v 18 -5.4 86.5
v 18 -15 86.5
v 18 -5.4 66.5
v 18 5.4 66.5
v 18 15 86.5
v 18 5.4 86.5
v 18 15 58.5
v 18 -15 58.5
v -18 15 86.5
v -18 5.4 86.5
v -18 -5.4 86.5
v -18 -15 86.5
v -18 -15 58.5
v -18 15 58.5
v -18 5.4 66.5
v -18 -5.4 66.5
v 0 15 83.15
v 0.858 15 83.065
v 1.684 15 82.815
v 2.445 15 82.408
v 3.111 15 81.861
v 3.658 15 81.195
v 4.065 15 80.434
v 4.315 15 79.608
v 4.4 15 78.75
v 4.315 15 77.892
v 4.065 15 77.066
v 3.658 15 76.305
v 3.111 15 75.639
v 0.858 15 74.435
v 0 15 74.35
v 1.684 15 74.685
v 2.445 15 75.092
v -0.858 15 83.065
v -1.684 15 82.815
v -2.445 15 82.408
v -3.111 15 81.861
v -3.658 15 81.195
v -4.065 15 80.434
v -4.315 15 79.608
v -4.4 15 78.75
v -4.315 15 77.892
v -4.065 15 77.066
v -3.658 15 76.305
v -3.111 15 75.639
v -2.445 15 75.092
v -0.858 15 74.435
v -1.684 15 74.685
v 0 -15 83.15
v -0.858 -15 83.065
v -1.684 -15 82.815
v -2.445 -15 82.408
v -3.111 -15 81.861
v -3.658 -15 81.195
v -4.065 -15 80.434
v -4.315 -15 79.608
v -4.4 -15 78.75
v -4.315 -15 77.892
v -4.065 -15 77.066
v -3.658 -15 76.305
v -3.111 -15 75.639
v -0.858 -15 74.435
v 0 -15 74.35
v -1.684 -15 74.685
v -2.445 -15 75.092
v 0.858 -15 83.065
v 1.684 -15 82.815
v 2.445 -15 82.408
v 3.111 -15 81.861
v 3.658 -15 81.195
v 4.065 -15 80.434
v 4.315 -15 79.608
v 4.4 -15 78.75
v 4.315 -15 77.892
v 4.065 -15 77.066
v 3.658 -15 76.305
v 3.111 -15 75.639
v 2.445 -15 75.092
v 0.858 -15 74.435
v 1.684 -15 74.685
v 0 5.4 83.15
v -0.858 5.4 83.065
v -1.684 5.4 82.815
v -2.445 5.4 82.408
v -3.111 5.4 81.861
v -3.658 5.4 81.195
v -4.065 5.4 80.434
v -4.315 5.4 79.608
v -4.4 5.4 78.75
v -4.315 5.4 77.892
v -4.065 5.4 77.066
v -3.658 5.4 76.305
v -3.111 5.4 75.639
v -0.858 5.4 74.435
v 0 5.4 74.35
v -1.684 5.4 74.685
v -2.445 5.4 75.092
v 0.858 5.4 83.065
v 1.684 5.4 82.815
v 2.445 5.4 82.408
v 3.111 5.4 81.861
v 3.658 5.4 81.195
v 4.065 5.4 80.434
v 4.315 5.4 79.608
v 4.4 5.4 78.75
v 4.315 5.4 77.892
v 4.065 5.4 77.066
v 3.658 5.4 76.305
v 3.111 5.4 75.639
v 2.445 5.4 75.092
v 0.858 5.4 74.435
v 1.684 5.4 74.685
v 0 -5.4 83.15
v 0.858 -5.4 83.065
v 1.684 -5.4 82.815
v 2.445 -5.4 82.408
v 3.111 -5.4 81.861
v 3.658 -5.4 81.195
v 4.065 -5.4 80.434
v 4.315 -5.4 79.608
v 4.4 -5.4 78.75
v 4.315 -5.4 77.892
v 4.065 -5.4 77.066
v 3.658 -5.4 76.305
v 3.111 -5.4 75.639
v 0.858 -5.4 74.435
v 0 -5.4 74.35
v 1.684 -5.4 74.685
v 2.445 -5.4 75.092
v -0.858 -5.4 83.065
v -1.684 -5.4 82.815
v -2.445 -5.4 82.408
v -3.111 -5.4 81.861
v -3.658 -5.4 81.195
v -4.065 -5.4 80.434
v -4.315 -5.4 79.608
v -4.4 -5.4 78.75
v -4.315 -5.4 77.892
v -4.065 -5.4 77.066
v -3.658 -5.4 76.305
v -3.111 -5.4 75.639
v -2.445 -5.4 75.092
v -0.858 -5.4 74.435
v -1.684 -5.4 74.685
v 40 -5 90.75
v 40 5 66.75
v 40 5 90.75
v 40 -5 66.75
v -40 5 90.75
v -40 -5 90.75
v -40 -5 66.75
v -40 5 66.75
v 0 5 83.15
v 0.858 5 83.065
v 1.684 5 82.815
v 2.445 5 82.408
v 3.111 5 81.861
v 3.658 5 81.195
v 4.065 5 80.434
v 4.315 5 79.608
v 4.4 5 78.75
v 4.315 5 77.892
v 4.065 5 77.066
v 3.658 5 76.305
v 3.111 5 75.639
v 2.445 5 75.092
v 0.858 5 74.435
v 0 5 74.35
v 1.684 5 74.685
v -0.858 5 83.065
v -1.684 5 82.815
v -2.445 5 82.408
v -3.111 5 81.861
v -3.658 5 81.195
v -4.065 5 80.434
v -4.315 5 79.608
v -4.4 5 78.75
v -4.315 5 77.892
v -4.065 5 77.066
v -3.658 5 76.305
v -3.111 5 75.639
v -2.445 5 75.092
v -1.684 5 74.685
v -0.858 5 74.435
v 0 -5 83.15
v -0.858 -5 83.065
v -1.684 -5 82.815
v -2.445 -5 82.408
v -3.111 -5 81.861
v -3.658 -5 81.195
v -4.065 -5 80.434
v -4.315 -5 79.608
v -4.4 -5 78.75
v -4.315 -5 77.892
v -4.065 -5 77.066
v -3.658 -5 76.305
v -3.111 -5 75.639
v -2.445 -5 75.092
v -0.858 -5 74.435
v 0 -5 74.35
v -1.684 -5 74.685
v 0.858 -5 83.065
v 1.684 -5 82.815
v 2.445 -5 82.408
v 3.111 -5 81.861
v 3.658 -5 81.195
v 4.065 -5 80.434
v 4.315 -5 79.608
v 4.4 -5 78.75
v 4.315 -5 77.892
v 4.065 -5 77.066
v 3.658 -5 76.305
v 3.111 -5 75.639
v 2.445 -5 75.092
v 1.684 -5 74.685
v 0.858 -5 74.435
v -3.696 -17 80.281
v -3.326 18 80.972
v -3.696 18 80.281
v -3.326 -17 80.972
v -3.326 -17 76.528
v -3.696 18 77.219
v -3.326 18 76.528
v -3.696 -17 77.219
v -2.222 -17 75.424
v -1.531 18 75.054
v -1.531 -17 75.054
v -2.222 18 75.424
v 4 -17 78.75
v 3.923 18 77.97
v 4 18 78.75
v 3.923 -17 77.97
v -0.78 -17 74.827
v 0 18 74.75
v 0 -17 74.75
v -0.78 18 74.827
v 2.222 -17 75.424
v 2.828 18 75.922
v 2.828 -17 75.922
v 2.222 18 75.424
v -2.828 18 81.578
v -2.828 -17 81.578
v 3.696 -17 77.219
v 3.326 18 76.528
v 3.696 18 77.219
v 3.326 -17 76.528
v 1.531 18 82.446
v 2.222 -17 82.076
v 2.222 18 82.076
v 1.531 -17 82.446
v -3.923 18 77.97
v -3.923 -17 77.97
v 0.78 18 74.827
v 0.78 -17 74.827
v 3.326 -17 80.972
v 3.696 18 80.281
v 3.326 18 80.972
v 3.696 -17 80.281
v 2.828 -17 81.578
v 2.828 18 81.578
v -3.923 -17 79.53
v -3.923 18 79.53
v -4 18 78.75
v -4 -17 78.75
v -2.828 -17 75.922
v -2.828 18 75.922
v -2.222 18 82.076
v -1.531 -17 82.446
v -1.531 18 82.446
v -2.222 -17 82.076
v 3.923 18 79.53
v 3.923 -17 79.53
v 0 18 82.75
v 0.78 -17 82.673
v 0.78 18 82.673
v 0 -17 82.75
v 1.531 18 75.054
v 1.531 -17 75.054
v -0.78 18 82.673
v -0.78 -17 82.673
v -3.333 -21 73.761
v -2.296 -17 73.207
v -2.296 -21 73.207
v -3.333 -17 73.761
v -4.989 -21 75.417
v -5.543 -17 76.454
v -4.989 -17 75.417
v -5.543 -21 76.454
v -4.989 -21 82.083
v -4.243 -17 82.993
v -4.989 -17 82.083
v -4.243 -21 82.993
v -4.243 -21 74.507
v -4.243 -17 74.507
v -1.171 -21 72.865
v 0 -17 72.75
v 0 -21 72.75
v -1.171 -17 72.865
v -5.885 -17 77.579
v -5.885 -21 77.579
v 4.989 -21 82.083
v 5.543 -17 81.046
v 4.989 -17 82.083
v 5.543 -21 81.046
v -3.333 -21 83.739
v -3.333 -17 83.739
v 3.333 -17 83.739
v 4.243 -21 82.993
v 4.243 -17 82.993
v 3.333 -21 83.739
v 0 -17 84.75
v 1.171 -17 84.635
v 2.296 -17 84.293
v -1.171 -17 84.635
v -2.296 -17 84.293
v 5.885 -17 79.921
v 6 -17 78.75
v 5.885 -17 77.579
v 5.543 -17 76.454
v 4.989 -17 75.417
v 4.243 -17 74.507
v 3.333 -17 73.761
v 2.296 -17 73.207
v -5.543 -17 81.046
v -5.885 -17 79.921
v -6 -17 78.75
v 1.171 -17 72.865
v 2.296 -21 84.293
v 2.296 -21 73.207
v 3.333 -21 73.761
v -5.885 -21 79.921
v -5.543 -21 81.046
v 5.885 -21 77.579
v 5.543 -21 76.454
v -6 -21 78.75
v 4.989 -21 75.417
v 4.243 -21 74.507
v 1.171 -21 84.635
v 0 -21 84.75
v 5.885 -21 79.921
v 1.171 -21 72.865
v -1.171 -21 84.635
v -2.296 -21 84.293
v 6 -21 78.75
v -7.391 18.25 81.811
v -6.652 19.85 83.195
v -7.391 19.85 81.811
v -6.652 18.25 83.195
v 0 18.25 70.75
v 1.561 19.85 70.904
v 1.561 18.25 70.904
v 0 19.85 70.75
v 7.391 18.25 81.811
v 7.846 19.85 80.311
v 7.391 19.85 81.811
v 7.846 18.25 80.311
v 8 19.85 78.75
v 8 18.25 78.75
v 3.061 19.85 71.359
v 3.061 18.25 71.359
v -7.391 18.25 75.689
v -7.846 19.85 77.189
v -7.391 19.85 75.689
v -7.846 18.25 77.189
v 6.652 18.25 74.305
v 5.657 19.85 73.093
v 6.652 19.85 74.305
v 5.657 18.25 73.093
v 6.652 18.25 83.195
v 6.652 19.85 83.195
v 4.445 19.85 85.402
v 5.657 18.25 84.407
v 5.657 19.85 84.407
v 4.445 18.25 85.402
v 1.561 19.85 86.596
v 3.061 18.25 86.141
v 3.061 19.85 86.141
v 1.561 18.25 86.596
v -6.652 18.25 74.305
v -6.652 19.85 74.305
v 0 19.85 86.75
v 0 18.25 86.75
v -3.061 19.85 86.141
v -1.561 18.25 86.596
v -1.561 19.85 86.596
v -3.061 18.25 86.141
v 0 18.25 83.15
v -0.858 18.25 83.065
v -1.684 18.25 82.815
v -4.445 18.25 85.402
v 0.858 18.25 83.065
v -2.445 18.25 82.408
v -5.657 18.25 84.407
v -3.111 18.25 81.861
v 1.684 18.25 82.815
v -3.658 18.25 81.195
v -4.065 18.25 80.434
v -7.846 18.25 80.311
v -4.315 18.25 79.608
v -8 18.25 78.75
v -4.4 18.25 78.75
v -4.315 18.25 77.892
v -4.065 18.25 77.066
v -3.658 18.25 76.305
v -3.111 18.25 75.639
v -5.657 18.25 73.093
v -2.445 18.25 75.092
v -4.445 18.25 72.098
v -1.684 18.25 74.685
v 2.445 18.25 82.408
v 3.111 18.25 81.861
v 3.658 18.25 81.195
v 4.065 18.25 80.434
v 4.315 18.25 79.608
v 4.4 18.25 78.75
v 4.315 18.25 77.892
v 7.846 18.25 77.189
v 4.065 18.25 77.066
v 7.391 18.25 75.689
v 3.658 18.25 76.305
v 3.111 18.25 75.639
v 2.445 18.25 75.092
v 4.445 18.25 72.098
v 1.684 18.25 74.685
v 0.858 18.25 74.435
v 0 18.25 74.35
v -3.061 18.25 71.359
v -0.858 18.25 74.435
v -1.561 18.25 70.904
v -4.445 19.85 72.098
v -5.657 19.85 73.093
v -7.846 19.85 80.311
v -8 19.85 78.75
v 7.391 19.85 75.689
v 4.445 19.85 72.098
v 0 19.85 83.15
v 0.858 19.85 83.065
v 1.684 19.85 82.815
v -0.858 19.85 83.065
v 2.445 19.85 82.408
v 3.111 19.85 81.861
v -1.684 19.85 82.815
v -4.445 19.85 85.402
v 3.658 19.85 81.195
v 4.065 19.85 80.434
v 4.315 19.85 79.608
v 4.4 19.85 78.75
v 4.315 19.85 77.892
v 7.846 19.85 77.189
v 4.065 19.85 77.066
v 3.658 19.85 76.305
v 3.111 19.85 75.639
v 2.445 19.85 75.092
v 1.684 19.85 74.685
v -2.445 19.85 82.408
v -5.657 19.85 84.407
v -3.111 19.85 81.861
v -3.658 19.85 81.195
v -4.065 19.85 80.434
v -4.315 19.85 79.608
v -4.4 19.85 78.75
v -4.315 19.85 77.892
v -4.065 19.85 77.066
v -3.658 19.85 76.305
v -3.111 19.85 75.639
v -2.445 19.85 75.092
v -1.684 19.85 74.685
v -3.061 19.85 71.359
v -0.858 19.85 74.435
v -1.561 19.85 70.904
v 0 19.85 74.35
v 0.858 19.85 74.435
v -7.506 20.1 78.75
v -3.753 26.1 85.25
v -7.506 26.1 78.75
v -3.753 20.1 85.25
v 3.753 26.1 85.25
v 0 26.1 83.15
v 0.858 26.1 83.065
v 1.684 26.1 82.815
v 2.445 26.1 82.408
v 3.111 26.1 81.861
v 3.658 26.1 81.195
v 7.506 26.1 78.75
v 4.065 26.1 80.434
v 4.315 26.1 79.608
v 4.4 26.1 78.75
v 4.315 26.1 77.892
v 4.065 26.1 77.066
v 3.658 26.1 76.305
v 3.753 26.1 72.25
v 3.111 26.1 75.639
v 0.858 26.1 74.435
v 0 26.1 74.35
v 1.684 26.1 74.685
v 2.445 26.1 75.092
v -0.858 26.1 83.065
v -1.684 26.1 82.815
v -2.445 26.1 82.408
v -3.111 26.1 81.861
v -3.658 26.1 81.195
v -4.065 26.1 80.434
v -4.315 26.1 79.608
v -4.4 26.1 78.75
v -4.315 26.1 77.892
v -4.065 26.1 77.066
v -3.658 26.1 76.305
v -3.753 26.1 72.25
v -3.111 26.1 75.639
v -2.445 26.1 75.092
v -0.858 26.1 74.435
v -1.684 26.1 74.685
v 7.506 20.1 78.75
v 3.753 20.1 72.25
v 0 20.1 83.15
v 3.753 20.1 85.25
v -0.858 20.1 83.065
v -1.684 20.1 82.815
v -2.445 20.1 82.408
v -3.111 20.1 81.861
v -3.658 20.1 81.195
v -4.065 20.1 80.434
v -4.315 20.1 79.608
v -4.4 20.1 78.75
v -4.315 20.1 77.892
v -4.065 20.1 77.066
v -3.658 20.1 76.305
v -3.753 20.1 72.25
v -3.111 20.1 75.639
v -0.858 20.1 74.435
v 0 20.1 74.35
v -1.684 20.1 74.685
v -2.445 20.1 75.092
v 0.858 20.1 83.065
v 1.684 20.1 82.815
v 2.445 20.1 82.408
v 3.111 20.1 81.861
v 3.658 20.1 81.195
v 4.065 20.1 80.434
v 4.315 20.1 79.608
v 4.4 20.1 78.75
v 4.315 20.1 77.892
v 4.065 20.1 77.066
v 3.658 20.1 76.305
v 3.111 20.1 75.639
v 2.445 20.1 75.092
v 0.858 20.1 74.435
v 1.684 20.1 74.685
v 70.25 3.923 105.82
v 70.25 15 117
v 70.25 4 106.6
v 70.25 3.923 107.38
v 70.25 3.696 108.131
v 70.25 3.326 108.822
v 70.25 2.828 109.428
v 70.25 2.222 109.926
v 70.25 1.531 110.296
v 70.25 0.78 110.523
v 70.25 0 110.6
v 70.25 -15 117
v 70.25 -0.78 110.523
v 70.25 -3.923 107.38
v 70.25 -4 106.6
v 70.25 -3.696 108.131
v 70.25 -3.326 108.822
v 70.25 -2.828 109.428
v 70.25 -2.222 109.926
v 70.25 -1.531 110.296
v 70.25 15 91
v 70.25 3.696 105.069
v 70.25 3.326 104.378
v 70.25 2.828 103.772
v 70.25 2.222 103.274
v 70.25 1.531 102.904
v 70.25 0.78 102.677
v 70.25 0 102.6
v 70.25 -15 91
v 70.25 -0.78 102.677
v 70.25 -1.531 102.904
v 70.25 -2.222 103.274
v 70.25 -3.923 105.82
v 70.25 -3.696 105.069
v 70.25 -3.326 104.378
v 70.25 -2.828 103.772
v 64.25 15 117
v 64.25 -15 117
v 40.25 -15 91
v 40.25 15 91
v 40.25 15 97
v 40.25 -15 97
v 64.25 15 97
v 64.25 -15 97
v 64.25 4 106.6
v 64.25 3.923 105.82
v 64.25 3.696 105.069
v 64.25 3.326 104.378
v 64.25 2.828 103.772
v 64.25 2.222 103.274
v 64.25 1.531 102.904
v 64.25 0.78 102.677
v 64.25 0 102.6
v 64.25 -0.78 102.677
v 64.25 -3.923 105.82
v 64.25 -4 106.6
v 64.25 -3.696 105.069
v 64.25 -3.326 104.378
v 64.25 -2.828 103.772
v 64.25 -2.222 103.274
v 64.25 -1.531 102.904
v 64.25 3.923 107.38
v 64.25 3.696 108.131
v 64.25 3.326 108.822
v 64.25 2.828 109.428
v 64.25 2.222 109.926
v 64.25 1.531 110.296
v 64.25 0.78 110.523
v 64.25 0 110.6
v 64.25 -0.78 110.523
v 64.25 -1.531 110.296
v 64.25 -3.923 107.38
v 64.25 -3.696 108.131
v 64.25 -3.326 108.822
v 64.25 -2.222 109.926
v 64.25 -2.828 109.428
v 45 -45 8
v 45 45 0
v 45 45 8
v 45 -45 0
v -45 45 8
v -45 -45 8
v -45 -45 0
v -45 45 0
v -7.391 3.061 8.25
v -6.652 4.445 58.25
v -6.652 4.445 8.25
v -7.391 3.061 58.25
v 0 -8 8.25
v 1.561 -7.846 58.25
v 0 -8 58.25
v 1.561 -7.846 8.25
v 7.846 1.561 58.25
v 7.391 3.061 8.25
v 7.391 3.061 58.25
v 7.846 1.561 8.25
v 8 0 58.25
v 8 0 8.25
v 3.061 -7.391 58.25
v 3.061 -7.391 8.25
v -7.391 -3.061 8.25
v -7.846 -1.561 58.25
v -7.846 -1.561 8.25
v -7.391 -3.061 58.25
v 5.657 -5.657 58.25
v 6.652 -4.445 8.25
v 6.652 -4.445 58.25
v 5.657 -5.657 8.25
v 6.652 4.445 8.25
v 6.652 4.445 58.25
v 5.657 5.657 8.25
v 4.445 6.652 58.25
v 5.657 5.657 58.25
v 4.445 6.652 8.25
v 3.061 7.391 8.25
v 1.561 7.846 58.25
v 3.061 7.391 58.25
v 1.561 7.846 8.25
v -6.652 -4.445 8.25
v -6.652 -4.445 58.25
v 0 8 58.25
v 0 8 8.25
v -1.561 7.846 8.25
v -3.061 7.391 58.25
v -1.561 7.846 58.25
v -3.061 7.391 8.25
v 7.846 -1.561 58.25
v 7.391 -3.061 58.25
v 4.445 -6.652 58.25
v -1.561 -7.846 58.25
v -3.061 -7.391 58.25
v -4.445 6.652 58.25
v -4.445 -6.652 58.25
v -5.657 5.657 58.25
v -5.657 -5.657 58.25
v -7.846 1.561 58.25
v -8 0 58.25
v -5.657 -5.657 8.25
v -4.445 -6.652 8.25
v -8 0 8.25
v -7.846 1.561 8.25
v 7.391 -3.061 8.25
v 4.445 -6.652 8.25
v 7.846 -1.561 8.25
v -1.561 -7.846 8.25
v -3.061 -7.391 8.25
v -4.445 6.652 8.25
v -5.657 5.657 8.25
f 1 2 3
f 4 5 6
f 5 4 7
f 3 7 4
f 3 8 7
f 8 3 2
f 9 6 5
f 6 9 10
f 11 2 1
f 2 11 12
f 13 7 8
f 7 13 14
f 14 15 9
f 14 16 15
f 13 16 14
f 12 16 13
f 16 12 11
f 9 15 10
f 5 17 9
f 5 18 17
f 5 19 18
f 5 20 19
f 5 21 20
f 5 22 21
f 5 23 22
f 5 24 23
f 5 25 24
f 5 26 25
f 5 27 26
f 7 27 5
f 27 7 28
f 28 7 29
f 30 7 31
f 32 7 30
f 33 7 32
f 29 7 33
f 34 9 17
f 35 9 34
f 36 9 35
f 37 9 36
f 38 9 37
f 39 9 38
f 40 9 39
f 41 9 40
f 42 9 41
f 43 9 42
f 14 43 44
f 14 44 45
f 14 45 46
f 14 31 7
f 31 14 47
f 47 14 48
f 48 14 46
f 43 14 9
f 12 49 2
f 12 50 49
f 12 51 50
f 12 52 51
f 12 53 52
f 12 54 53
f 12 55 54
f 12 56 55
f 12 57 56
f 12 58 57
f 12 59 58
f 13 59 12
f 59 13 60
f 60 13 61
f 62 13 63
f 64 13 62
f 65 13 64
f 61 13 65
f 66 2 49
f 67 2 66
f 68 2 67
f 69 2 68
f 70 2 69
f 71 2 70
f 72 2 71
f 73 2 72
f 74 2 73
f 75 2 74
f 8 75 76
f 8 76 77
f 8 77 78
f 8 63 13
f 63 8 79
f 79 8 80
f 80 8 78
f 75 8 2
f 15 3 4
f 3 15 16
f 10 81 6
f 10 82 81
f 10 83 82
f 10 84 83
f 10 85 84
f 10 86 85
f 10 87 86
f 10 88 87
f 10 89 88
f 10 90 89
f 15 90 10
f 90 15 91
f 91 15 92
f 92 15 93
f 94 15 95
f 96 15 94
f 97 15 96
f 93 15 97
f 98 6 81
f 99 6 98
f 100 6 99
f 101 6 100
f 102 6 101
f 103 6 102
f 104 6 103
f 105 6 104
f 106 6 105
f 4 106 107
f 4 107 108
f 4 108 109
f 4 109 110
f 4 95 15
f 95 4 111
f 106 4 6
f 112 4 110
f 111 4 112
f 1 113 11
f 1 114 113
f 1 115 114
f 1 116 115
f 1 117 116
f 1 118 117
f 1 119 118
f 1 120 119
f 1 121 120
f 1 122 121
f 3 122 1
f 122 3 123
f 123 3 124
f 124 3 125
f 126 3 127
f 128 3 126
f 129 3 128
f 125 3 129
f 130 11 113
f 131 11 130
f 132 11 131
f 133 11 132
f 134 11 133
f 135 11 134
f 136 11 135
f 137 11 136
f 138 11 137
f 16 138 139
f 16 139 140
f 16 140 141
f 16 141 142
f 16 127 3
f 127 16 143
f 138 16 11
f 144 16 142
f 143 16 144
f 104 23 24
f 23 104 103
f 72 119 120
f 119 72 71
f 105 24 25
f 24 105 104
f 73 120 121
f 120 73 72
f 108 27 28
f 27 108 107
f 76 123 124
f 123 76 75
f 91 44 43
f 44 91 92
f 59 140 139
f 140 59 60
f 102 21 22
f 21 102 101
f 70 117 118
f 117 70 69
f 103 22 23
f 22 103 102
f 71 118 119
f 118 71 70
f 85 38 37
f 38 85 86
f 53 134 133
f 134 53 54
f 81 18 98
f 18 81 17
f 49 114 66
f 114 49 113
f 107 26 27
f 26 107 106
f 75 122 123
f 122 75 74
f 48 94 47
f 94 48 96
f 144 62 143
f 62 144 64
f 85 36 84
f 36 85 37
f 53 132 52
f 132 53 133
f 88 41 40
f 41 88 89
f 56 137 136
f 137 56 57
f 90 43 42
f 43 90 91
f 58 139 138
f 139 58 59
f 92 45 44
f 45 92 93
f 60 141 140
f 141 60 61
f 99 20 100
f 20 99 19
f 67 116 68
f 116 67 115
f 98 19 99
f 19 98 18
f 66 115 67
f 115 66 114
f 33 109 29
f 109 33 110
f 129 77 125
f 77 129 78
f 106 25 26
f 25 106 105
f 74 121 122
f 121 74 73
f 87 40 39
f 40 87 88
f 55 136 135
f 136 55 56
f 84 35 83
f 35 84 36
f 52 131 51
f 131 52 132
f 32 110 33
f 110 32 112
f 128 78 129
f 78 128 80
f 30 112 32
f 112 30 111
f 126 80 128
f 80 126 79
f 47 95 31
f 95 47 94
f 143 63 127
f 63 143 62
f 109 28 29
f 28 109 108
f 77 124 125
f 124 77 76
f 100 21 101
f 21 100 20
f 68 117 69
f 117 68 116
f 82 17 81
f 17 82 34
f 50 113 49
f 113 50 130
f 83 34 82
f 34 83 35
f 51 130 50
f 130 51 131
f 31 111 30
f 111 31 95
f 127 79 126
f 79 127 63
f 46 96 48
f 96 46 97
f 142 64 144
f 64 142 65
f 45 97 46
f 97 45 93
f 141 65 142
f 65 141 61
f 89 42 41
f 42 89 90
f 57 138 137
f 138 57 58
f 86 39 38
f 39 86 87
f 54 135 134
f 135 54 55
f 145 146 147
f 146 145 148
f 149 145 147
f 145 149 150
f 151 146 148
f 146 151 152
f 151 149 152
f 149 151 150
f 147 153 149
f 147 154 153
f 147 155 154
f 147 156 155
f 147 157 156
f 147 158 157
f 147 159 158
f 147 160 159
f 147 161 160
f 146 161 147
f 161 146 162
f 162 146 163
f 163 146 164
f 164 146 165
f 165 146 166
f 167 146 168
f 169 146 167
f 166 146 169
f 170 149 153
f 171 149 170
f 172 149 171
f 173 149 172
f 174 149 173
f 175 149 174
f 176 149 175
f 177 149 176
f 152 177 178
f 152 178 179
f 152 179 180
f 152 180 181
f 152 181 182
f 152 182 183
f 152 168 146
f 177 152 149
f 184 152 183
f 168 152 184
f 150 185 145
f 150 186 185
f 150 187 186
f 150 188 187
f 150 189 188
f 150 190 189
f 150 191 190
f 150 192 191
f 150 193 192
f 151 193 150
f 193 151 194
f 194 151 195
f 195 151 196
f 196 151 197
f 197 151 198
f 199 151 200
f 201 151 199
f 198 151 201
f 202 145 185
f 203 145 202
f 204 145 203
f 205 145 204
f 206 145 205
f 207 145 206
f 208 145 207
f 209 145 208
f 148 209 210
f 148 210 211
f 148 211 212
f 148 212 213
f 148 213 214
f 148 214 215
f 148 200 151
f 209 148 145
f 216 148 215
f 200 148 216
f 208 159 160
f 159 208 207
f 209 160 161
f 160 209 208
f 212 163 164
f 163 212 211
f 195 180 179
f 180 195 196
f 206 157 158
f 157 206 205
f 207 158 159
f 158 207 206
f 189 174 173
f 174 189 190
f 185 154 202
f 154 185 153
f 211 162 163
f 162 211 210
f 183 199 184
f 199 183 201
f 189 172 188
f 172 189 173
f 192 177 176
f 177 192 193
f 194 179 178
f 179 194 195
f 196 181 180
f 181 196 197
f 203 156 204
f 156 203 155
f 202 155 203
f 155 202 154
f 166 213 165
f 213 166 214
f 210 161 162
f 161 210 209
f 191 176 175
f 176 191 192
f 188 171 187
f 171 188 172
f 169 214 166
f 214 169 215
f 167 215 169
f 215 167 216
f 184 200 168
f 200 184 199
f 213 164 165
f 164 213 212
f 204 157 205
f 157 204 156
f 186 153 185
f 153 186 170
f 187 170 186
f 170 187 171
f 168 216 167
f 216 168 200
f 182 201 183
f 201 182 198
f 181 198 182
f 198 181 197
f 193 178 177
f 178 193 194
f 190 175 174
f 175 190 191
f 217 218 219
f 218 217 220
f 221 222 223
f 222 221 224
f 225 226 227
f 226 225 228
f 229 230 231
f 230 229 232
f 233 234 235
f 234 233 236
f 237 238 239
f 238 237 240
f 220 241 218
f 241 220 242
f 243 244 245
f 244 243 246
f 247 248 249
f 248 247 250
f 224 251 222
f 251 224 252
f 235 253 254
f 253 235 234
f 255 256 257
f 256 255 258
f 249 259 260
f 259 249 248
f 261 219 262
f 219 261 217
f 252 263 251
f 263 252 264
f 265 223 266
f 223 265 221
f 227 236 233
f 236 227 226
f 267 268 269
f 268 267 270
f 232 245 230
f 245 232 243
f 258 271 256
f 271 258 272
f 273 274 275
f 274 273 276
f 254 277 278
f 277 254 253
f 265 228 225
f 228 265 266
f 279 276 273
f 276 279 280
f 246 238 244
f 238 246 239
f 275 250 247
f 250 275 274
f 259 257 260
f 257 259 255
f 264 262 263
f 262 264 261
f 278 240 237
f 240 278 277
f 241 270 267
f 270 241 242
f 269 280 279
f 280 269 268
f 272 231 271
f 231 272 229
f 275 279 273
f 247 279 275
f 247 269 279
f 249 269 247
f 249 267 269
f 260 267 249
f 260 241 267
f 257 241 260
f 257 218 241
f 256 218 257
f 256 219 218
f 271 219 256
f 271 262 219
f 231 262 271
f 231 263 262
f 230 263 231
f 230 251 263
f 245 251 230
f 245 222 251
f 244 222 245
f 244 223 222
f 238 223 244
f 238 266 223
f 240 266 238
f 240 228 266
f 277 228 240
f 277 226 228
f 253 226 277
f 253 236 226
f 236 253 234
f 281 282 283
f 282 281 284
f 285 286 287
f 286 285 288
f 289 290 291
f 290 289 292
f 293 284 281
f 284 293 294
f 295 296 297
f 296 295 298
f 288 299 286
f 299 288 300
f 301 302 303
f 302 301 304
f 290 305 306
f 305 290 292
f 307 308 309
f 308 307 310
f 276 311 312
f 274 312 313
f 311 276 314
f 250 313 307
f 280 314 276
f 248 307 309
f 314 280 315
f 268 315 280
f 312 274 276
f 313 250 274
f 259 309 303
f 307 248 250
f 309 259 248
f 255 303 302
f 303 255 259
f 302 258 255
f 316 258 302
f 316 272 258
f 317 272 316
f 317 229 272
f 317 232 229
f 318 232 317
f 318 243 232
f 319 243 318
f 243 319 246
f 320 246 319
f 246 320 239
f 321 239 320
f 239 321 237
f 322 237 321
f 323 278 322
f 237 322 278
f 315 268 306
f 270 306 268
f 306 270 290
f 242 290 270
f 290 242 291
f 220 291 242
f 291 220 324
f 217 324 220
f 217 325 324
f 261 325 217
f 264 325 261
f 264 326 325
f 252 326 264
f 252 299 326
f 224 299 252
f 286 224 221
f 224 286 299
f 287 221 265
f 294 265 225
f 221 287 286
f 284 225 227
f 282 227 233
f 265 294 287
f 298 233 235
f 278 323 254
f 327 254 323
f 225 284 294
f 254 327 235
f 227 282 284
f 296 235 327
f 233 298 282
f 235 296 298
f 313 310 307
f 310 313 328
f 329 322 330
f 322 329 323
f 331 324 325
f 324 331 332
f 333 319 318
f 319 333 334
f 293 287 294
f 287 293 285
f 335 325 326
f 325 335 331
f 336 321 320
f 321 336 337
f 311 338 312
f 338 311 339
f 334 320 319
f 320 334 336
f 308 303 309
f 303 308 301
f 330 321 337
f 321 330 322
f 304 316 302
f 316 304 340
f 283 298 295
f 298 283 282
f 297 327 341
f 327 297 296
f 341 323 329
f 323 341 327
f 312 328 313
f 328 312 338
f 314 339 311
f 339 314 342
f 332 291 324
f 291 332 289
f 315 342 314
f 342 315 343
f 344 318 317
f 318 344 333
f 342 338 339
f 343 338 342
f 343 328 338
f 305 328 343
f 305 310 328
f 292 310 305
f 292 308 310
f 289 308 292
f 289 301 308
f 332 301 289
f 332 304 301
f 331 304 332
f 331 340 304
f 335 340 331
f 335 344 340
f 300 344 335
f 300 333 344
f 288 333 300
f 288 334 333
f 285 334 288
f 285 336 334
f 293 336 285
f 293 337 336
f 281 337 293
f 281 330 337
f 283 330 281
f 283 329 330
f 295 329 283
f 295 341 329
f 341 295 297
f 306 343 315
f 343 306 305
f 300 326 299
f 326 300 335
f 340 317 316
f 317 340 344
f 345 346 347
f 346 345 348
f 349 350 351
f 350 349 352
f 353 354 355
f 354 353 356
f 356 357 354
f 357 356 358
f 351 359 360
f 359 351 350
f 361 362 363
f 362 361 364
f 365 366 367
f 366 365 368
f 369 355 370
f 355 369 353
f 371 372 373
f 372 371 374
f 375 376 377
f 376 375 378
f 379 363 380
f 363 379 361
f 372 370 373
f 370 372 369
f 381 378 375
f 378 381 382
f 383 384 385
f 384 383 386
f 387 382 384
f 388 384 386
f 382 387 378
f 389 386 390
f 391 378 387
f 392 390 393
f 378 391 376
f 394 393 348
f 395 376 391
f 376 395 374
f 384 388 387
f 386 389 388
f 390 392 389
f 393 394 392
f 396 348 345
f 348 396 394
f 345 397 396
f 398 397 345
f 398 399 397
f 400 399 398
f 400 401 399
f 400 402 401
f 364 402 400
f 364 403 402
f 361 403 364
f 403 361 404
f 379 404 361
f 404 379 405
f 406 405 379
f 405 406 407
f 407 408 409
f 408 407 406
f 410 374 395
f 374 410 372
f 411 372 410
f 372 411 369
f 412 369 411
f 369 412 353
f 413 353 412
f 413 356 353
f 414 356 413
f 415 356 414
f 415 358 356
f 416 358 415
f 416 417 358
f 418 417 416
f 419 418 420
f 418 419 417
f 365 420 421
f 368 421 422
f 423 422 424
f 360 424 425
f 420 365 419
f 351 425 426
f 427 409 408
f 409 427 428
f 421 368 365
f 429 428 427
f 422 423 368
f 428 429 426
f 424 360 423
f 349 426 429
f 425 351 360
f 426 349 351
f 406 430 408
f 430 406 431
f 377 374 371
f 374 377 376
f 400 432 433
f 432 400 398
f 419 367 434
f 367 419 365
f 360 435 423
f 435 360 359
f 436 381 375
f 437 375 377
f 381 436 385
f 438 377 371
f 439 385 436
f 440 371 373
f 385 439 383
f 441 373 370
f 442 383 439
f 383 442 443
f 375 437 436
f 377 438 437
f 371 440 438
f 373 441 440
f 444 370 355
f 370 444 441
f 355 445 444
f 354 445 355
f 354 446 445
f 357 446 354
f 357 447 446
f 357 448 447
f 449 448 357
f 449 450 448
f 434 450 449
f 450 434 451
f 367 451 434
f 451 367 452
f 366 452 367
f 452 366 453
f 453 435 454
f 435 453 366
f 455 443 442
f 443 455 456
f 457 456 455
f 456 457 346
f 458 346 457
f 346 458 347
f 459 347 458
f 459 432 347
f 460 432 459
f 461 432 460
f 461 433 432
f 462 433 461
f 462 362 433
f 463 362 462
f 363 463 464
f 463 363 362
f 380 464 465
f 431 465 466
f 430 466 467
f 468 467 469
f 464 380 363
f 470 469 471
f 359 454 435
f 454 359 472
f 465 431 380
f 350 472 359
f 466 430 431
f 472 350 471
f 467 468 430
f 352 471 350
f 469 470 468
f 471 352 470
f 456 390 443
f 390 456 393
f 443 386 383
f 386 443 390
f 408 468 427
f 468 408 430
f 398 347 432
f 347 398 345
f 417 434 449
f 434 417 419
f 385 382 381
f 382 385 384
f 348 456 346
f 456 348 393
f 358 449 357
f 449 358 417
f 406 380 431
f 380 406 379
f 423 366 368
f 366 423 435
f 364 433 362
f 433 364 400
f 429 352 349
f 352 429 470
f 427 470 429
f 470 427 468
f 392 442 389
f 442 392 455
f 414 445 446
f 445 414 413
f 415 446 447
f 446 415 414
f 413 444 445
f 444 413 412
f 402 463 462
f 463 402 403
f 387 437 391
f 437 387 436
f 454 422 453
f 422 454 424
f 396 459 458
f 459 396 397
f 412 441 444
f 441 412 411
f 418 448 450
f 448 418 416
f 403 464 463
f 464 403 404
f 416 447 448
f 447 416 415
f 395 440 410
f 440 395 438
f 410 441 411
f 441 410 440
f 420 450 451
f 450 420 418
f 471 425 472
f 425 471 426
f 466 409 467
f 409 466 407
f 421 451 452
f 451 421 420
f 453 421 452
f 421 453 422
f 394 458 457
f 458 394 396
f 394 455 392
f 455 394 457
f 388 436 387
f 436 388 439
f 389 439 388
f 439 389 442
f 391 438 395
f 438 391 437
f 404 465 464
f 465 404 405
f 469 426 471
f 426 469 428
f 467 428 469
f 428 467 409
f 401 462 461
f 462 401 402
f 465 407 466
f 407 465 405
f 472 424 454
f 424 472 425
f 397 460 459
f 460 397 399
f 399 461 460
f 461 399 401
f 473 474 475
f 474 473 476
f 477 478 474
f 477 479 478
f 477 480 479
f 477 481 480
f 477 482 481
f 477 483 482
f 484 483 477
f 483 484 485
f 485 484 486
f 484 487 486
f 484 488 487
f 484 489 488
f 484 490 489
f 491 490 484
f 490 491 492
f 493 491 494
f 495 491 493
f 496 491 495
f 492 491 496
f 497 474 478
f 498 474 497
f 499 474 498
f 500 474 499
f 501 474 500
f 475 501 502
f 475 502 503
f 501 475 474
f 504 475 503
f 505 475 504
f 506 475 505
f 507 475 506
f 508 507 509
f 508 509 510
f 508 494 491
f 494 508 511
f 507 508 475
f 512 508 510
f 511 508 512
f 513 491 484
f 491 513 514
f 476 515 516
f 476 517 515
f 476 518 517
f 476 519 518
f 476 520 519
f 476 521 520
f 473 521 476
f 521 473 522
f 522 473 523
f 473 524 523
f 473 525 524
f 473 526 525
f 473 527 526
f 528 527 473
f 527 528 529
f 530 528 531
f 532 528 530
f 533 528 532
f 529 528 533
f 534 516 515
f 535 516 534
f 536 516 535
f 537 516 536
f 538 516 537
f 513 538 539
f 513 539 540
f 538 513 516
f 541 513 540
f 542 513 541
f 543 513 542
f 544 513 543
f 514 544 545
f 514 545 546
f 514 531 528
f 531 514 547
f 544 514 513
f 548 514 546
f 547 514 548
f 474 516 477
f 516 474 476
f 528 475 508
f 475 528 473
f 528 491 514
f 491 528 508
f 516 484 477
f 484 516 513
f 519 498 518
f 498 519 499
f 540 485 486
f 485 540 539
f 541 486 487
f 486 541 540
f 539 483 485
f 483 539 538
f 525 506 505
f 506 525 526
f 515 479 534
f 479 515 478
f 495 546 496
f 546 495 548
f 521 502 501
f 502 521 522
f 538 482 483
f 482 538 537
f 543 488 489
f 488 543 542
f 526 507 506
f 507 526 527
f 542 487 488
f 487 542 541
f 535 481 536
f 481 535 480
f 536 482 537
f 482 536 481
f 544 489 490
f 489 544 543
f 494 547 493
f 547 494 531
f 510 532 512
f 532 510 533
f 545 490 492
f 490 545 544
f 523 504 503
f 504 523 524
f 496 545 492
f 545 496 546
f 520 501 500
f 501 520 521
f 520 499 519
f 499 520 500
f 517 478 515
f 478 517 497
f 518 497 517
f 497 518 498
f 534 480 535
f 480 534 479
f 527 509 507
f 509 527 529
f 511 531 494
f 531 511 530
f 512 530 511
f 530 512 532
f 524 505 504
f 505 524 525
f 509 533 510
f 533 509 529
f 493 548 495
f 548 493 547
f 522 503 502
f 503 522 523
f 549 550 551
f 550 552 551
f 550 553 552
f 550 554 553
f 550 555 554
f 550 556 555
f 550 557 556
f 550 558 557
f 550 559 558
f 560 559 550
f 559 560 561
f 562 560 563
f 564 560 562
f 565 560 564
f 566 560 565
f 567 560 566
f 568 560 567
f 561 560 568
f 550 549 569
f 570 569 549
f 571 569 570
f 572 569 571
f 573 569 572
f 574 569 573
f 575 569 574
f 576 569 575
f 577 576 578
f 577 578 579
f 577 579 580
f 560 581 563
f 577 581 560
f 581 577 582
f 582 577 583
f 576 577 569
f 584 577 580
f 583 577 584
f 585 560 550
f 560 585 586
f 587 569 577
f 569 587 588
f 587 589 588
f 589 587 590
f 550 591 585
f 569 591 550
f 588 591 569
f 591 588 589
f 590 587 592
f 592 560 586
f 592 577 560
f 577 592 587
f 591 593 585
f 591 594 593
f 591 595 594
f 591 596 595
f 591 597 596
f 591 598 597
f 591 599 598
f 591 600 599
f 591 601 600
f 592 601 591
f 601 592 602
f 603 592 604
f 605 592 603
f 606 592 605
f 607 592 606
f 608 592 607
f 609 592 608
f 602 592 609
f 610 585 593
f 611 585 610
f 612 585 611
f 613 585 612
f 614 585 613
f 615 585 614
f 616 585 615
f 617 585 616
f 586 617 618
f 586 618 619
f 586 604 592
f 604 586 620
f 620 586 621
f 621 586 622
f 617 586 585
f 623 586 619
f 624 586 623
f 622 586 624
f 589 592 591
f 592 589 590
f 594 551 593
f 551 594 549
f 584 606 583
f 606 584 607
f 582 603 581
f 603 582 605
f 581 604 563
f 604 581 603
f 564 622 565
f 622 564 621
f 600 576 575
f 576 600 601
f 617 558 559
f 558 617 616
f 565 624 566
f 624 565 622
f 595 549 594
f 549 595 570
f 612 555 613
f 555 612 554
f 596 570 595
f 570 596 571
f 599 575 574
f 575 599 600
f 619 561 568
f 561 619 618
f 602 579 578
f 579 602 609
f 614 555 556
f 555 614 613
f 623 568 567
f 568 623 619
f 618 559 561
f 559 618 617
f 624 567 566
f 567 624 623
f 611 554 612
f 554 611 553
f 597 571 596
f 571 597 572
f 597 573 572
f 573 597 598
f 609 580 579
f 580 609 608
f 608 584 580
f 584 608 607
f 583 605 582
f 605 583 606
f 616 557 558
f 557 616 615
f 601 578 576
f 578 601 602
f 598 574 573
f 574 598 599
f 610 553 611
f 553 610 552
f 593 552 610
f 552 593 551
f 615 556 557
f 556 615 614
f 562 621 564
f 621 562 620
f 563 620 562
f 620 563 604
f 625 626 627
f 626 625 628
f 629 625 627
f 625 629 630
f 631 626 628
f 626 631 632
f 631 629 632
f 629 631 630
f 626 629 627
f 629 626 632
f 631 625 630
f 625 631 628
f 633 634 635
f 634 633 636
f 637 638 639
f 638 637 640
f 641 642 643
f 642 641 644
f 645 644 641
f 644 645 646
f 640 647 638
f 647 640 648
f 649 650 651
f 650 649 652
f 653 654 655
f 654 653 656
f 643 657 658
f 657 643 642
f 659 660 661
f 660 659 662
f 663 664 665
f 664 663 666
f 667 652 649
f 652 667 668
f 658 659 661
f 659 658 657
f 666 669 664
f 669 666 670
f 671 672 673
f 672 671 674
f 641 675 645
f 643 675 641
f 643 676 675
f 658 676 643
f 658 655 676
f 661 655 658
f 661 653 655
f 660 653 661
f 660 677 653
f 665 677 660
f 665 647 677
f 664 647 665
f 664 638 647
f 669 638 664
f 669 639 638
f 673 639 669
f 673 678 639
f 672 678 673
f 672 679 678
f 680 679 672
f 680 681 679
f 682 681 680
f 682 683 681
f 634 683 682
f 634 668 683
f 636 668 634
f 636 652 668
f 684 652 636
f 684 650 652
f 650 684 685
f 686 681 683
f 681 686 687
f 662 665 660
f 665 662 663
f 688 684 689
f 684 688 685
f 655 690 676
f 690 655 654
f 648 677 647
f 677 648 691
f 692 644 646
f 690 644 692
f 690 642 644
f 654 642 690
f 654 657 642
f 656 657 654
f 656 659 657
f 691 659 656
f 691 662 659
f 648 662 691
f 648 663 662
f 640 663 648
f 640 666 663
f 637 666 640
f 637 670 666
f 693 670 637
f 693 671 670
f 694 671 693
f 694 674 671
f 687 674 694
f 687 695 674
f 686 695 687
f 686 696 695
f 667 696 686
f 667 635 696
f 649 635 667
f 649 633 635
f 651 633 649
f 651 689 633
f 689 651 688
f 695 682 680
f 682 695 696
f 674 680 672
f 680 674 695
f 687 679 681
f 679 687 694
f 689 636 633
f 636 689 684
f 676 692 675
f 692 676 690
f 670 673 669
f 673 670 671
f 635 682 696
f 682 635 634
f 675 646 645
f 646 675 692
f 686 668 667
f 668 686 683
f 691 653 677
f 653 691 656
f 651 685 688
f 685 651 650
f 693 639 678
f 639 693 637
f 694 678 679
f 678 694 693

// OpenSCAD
$fn = 32;

// ------------------------------------------------------------------------
// Lamp arm: column d16 x 50 mm, arm 80 mm
// Every part is its own module, assembly() places every instance.
// ------------------------------------------------------------------------

// --- part 1 ---
module lamp_base() {
  difference() {
    translate([-45, -45, 0]) cube([90, 90, 8]);
  }
}

// --- part 2 ---
module lamp_column() {
  cylinder(h = 50, d = 16);
}

// --- part 3 ---
module head_fork() {
  difference() {
    translate([-18, -15, 0]) cube([36, 30, 28]);
    translate([-19, -5.4, 8]) cube([38, 10.8, 21]);
    translate([0, 0, 20.25]) rotate([90, 0, 0]) cylinder(h = 32, d = 8.8, center = true);
  }
}

// --- part 4 ---
module lamp_arm() {
  difference() {
    translate([-40, -5, 0]) cube([80, 10, 24]);
    translate([0, 0, 12]) rotate([90, 0, 0]) cylinder(h = 12, d = 8.8, center = true);
  }
}

// --- part 5 ---
module arm_pin() {
  rotate([0, 90, 0]) cylinder(h = 36, d = 8, center = true);
  translate([-21, 0, 0]) rotate([0, 90, 0]) cylinder(h = 4, d = 12);
}

// --- part 6 ---
module arm_washer() {
  difference() {
      translate([0, 0, 0]) cylinder(h = 1.6, d = 16);
      translate([0, 0, -1]) cylinder(h = 3.6, d = 8.8);
    }
}

// --- part 7 ---
module arm_nut() {
  difference() {
    linear_extrude(height = 6) polygon(points = [[7.506, 0], [3.753, 6.5], [-3.753, 6.5], [-7.506, 0], [-3.753, -6.5], [3.753, -6.5]]);
    translate([0, 0, -1]) cylinder(h = 8, d = 8.8);
  }
}

// --- part 8 ---
module shade_bracket() {
  difference() {
    translate([-15, -15, 0]) cube([30, 30, 26]);
    translate([-16, -16, 6]) cube([25, 32, 21]);
    translate([12, 0, 15.6]) rotate([0, 90, 0]) cylinder(h = 8, d = 8, center = true);
  }
}

// --- assembly ---
module assembly() {
  color([0.80, 0.24, 0.20]) translate([0, 0, 0]) rotate([0, 0, 0]) lamp_base();
  color([0.20, 0.45, 0.75]) translate([0, 0, 8.25]) rotate([0, 0, 0]) lamp_column();
  color([0.25, 0.62, 0.32]) translate([0, 0, 58.5]) rotate([0, 0, 0]) head_fork();
  color([0.92, 0.70, 0.18]) translate([0, 0, 66.75]) rotate([0, 0, 0]) lamp_arm();
  color([0.58, 0.35, 0.70]) translate([0, 0, 78.75]) rotate([0, 0, 90]) arm_pin();
  color([0.16, 0.66, 0.66]) translate([0, 19.85, 78.75]) rotate([90, 0, 0]) arm_washer();
  color([0.85, 0.48, 0.18]) translate([0, 26.1, 78.75]) rotate([90, 0, 0]) arm_nut();
  color([0.55, 0.60, 0.65]) translate([55.25, 0, 91]) rotate([0, 0, 0]) shade_bracket();
}

assembly();
